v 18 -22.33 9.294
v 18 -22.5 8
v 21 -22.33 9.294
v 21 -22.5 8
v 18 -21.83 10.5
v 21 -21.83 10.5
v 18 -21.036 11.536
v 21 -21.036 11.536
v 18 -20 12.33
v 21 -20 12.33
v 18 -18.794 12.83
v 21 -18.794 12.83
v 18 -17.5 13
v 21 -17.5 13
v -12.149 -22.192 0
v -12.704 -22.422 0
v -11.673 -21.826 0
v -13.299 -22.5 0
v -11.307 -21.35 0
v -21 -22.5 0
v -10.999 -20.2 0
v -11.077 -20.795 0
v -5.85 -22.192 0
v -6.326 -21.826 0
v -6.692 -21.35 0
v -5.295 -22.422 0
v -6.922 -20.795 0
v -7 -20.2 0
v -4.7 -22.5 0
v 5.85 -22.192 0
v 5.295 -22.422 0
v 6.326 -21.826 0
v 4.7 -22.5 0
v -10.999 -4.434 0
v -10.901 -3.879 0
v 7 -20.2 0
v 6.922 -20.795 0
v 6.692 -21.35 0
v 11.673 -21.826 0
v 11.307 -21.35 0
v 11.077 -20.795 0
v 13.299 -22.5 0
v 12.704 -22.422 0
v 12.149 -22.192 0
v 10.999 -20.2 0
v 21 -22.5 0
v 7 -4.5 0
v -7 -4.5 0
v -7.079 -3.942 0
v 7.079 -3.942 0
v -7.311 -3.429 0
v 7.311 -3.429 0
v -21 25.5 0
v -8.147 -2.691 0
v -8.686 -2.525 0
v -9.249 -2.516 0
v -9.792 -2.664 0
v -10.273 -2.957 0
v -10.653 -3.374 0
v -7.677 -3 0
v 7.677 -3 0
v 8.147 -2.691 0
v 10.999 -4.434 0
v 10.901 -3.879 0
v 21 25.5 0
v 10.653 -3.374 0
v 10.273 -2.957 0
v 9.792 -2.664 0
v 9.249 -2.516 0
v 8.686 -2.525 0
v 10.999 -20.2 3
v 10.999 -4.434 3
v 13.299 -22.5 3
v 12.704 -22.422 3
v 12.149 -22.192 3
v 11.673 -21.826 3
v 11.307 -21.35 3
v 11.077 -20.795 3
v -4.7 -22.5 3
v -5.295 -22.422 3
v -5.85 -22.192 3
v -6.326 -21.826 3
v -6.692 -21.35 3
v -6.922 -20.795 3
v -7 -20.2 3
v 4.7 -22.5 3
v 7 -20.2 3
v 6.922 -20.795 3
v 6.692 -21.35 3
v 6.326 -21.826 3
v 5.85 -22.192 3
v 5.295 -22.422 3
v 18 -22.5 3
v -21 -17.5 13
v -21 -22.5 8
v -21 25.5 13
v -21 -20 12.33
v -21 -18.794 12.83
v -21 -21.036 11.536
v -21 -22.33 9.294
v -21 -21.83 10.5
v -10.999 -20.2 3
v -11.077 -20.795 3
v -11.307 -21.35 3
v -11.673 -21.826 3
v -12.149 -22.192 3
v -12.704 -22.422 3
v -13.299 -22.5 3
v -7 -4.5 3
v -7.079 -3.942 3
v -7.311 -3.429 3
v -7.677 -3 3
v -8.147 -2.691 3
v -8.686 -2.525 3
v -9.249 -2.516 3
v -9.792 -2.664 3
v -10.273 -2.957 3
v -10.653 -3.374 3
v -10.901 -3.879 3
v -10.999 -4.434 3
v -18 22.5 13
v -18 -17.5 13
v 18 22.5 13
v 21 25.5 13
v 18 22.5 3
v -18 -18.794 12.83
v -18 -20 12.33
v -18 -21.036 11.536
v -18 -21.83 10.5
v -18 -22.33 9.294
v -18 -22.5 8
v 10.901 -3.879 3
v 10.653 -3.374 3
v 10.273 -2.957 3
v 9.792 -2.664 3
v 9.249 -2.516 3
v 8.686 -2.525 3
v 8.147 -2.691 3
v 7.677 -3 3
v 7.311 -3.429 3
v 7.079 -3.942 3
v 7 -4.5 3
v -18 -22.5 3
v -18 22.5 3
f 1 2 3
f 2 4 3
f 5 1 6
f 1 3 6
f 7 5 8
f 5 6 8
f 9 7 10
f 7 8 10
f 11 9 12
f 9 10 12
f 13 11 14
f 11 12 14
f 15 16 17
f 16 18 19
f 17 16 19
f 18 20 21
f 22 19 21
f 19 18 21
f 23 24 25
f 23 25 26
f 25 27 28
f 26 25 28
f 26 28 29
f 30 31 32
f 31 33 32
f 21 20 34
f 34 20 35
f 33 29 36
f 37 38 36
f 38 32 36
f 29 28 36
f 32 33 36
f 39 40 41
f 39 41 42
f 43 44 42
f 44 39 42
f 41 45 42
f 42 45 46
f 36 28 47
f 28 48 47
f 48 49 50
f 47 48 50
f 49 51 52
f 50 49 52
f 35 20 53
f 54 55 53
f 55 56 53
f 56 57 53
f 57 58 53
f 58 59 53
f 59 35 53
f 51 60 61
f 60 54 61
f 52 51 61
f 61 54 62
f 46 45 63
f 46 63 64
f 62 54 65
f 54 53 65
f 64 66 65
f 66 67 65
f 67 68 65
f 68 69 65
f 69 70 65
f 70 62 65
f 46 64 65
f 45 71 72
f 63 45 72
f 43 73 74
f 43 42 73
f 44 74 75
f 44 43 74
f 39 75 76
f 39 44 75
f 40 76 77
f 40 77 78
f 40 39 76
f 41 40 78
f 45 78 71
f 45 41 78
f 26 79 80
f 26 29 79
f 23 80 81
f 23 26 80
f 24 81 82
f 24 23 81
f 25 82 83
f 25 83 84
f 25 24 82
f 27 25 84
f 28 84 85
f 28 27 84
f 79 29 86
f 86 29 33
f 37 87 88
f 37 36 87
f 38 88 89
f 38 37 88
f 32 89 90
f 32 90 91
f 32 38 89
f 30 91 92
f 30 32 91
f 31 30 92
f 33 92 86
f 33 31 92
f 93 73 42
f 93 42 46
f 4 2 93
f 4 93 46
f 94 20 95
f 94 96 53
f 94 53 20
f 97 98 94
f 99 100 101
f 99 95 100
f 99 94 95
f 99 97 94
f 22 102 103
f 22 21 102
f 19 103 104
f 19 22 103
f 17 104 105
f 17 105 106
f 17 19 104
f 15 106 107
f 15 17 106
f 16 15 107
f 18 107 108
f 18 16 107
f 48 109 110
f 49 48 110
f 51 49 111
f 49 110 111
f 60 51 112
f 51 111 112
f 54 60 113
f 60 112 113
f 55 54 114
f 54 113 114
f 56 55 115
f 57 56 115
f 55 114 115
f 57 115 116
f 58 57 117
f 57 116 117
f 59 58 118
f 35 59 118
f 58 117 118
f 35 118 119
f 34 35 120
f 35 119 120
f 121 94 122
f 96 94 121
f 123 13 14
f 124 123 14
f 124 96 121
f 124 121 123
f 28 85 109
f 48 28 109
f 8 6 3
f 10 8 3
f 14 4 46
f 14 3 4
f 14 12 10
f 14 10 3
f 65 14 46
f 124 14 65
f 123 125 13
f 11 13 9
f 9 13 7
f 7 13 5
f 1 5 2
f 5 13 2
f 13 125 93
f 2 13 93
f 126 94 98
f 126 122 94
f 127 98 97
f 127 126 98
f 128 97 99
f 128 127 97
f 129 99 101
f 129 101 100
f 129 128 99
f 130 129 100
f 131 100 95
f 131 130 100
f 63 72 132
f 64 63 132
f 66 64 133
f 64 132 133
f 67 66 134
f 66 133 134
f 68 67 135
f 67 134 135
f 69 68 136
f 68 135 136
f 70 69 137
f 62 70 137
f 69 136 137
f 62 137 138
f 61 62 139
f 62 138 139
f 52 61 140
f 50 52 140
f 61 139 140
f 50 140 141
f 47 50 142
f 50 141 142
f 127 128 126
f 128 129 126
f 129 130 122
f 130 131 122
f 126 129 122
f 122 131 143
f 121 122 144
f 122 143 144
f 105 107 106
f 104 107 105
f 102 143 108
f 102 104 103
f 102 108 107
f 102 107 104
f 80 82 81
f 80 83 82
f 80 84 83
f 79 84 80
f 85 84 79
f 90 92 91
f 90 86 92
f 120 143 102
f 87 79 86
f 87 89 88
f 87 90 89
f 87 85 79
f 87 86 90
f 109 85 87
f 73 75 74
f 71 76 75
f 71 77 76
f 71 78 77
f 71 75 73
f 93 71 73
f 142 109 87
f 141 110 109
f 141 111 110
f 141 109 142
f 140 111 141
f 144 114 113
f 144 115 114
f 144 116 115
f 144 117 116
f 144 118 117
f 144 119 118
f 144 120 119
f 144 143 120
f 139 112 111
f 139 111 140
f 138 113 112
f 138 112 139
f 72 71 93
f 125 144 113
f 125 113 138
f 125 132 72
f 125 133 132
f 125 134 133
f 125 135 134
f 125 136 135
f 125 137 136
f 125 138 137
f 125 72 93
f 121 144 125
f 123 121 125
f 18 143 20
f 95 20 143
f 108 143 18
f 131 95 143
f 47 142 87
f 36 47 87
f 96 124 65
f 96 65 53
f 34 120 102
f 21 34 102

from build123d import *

# Parameters (mm, degrees)
F0_W          = 36
F0_H          = 45
F1_DEPTH      = 3
F3_DEPTH      = 3
F5_DEPTH      = 10
F5_DEPTH_BACK = 3
F6_R          = 2.3
F7_R          = 5


with BuildPart() as f1:
    # F0 (on Top) → F1 (new body)
    with BuildSketch(Plane.XY):
        Rectangle(F0_W, F0_H)
    extrude(amount=F1_DEPTH)

    # F2 (on face) → F3 (cut)
    with BuildSketch(Plane.XY.offset(3)):
        with BuildLine():
            Line((-7, -22.5), (-7, -4.5))
            ThreePointArc((-7, -4.5), (-8.9668645083, -2.500274509), (-10.9989020392, -4.4337381126))
            Line((-10.9989020392, -4.4337381126), (-10.9989020392, -4.5662618874))
            Line((-10.9989020392, -4.5662618874), (-10.9989020392, -22.5))
            Line((-10.9989020392, -22.5), (-7, -22.5))
        make_face()
        with BuildLine():
            Line((7, -4.5), (7, -22.5))
            Line((7, -22.5), (10.9989020392, -22.5))
            Line((10.9989020392, -22.5), (10.9989020392, -4.5662618874))
            Line((10.9989020392, -4.5662618874), (10.9989020392, -4.4337381126))
            ThreePointArc((10.9989020392, -4.4337381126), (8.9668645083, -2.500274509), (7, -4.5))
        make_face()
    extrude(amount=-F3_DEPTH, mode=Mode.SUBTRACT)

    # F4 (on face) → F5 (join, two sides)
    with BuildSketch(Plane.XY.offset(3)) as f5_sk:
        Polygon((18, -22.5), (20.9999997169, -22.5), (20.9999997169, 25.4999997169), (-20.9999997169, 25.4999997169), (-20.9999997169, -22.5), (-18, -22.5), (-18, 22.5), (18, 22.5), align=None)
    extrude(amount=F5_DEPTH)
    extrude(f5_sk.sketch, amount=-F5_DEPTH_BACK)

    # F6
    f6_edges = [f1.edges().sort_by_distance(p)[0] for p in [
        (-10.998902, -22.5, 1.5),
        (-7, -22.5, 1.5),
        (7, -22.5, 1.5),
        (10.998902, -22.5, 1.5),
    ]]
    fillet(f6_edges, radius=F6_R)

    # F7
    f7_edges = [f1.edges().sort_by_distance(p)[0] for p in [
        (-19.5, -22.5, 13),
        (19.5, -22.5, 13),
    ]]
    fillet(f7_edges, radius=F7_R)


solid = f1.part
